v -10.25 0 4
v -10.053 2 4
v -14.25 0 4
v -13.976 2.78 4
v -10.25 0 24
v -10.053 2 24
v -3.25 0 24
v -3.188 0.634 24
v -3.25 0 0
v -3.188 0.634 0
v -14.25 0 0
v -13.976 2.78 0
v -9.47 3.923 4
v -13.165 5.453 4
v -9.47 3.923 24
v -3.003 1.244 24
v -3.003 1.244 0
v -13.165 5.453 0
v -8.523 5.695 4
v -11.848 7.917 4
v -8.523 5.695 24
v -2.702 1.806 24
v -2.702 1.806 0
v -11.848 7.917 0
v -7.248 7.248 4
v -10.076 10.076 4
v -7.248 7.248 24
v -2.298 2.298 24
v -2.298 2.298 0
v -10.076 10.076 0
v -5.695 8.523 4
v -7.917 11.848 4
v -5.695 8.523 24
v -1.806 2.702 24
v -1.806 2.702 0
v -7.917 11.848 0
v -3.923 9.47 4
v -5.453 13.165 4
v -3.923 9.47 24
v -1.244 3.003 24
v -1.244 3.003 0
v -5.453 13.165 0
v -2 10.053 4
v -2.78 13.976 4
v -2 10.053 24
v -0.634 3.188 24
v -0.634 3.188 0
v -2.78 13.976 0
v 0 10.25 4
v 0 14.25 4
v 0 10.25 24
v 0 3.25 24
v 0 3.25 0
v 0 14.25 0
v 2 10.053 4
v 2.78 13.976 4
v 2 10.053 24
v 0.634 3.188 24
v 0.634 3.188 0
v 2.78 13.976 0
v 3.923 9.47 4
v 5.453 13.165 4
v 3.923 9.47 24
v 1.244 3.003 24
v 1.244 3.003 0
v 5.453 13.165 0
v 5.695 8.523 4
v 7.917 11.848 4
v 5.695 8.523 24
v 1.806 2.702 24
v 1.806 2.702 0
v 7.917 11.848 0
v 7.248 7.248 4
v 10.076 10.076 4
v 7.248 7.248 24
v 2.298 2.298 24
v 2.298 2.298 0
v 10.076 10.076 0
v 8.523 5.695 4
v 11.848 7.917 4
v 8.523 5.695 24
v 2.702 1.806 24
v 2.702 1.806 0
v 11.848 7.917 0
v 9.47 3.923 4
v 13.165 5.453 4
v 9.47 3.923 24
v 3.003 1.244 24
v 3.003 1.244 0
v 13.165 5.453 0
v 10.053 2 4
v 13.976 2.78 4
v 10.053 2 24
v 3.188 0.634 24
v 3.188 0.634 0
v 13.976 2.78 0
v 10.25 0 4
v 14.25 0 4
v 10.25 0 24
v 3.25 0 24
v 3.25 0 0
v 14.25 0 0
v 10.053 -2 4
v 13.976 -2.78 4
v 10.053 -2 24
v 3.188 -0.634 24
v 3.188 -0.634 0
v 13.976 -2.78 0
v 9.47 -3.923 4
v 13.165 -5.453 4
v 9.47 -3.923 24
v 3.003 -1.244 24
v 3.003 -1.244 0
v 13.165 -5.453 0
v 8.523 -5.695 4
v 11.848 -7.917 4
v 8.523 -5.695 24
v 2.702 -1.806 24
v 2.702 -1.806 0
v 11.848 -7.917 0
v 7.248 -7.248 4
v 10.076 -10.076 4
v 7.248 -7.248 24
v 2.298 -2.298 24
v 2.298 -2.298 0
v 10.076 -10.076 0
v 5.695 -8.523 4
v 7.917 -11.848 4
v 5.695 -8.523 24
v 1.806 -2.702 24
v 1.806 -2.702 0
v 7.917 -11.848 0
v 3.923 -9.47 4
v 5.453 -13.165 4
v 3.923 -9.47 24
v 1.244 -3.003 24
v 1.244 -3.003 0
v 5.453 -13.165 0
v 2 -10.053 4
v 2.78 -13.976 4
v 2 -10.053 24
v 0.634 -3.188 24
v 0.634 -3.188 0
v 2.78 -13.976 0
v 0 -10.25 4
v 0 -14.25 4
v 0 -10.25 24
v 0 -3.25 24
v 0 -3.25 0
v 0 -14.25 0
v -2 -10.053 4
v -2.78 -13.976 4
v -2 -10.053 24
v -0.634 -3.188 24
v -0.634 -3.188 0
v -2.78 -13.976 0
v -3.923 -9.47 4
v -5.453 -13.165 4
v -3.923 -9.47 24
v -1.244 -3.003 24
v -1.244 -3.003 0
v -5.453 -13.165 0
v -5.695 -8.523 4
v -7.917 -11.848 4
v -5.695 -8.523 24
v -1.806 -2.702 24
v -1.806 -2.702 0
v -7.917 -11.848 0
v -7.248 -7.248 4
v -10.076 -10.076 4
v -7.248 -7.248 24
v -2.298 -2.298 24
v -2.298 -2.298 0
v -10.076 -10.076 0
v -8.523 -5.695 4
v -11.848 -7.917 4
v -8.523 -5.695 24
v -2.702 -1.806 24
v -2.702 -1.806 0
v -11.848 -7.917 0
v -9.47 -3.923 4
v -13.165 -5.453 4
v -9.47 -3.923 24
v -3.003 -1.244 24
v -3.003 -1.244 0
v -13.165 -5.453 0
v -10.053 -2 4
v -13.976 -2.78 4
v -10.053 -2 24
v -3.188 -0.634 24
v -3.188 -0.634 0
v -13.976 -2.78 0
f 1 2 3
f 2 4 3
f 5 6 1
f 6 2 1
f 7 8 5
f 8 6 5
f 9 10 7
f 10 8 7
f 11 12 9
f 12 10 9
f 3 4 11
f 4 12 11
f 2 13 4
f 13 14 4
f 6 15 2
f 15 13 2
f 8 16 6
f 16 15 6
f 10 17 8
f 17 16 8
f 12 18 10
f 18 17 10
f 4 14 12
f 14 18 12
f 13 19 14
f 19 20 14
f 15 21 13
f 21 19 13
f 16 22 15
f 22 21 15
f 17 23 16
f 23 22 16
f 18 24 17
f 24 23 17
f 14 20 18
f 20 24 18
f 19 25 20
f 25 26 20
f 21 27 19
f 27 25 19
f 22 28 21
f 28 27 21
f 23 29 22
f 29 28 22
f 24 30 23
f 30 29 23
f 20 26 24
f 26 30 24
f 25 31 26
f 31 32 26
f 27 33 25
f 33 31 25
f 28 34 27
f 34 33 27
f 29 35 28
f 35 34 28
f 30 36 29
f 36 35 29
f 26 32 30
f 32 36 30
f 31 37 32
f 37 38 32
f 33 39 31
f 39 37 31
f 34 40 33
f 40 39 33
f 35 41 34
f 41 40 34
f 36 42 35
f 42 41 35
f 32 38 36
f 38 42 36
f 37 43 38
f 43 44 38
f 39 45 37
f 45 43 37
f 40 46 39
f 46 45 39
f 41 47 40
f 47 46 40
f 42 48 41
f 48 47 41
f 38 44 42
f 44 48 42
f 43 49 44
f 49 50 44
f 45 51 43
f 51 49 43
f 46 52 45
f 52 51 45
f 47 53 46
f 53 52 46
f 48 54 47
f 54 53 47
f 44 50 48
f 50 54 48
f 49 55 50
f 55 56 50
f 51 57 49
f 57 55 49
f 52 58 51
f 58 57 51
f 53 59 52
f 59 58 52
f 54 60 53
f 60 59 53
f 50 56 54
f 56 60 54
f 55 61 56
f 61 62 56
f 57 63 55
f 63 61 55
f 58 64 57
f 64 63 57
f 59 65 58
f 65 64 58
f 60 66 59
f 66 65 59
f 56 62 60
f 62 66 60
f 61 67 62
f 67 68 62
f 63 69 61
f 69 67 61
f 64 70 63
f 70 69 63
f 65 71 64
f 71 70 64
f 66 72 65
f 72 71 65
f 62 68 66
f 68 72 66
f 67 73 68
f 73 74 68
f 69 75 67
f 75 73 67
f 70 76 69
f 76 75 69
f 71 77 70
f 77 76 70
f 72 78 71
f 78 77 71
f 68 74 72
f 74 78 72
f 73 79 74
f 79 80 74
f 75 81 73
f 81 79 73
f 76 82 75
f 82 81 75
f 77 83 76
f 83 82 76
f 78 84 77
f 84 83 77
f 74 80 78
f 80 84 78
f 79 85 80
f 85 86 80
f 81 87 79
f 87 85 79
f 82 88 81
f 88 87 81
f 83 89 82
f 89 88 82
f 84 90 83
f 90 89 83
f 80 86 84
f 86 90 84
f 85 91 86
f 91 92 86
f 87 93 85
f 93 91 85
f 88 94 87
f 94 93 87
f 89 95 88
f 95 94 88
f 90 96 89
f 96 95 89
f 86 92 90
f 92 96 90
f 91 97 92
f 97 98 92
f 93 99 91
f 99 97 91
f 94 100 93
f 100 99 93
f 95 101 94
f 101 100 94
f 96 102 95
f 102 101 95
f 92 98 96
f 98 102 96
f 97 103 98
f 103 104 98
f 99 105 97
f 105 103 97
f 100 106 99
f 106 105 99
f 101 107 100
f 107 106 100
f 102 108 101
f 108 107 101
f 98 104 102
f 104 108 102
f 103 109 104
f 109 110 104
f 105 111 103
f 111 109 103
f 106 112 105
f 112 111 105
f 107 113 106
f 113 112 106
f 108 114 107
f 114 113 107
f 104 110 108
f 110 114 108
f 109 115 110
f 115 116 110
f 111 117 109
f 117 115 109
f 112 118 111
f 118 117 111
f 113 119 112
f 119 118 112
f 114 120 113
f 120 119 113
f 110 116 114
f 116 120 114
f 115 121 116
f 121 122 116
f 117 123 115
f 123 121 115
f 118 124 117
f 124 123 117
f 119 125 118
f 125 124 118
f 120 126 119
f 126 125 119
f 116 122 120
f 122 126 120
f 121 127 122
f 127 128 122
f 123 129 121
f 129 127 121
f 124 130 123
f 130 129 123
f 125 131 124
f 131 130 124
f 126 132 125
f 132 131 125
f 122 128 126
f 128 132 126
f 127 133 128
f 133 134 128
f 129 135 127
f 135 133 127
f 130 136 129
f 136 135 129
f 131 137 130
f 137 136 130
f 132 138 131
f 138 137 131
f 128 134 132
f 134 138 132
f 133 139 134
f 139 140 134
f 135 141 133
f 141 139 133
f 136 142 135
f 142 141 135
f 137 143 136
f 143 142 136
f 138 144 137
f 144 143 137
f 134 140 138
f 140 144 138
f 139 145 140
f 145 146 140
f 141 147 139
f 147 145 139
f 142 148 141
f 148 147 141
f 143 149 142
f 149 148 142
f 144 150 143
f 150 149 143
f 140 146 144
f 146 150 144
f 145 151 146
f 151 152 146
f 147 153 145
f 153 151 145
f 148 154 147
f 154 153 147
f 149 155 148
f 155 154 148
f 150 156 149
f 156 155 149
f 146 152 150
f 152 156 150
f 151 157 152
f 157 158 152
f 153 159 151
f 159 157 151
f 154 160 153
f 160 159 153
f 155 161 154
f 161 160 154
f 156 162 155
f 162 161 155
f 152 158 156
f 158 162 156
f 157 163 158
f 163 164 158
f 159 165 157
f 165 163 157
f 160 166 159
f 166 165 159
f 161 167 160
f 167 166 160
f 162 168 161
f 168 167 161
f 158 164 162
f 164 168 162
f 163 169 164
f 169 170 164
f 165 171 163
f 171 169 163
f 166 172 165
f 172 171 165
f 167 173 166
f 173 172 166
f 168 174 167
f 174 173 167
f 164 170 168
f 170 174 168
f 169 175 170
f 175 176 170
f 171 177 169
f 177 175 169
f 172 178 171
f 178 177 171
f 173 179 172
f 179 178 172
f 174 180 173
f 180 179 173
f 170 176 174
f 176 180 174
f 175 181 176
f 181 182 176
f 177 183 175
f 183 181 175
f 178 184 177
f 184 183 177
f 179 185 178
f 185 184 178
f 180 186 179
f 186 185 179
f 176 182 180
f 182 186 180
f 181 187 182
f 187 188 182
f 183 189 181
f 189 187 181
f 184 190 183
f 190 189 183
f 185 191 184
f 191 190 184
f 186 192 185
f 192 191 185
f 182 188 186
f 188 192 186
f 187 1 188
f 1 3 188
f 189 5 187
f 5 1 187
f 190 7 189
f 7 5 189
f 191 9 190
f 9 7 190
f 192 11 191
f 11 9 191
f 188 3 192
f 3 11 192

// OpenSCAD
$fn = 32;

// ----------------------------------------------------------------------
// Profiled standoff: flanged spacer, 24 mm long, bore 6.5 mm
// ----------------------------------------------------------------------

// --- parameters (mm) ---
revolve_angle = 360;      // full turn around the Z axis
profile_points = 6;       // points of the closed outline

profile = [[3.25, 0], [14.25, 0], [14.25, 4], [10.25, 4], [10.25, 24], [3.25, 24]];  // single closed polygon, 6 points, counter clockwise

// --- the one profile operation ---
rotate_extrude(angle = revolve_angle) polygon(points = profile);
